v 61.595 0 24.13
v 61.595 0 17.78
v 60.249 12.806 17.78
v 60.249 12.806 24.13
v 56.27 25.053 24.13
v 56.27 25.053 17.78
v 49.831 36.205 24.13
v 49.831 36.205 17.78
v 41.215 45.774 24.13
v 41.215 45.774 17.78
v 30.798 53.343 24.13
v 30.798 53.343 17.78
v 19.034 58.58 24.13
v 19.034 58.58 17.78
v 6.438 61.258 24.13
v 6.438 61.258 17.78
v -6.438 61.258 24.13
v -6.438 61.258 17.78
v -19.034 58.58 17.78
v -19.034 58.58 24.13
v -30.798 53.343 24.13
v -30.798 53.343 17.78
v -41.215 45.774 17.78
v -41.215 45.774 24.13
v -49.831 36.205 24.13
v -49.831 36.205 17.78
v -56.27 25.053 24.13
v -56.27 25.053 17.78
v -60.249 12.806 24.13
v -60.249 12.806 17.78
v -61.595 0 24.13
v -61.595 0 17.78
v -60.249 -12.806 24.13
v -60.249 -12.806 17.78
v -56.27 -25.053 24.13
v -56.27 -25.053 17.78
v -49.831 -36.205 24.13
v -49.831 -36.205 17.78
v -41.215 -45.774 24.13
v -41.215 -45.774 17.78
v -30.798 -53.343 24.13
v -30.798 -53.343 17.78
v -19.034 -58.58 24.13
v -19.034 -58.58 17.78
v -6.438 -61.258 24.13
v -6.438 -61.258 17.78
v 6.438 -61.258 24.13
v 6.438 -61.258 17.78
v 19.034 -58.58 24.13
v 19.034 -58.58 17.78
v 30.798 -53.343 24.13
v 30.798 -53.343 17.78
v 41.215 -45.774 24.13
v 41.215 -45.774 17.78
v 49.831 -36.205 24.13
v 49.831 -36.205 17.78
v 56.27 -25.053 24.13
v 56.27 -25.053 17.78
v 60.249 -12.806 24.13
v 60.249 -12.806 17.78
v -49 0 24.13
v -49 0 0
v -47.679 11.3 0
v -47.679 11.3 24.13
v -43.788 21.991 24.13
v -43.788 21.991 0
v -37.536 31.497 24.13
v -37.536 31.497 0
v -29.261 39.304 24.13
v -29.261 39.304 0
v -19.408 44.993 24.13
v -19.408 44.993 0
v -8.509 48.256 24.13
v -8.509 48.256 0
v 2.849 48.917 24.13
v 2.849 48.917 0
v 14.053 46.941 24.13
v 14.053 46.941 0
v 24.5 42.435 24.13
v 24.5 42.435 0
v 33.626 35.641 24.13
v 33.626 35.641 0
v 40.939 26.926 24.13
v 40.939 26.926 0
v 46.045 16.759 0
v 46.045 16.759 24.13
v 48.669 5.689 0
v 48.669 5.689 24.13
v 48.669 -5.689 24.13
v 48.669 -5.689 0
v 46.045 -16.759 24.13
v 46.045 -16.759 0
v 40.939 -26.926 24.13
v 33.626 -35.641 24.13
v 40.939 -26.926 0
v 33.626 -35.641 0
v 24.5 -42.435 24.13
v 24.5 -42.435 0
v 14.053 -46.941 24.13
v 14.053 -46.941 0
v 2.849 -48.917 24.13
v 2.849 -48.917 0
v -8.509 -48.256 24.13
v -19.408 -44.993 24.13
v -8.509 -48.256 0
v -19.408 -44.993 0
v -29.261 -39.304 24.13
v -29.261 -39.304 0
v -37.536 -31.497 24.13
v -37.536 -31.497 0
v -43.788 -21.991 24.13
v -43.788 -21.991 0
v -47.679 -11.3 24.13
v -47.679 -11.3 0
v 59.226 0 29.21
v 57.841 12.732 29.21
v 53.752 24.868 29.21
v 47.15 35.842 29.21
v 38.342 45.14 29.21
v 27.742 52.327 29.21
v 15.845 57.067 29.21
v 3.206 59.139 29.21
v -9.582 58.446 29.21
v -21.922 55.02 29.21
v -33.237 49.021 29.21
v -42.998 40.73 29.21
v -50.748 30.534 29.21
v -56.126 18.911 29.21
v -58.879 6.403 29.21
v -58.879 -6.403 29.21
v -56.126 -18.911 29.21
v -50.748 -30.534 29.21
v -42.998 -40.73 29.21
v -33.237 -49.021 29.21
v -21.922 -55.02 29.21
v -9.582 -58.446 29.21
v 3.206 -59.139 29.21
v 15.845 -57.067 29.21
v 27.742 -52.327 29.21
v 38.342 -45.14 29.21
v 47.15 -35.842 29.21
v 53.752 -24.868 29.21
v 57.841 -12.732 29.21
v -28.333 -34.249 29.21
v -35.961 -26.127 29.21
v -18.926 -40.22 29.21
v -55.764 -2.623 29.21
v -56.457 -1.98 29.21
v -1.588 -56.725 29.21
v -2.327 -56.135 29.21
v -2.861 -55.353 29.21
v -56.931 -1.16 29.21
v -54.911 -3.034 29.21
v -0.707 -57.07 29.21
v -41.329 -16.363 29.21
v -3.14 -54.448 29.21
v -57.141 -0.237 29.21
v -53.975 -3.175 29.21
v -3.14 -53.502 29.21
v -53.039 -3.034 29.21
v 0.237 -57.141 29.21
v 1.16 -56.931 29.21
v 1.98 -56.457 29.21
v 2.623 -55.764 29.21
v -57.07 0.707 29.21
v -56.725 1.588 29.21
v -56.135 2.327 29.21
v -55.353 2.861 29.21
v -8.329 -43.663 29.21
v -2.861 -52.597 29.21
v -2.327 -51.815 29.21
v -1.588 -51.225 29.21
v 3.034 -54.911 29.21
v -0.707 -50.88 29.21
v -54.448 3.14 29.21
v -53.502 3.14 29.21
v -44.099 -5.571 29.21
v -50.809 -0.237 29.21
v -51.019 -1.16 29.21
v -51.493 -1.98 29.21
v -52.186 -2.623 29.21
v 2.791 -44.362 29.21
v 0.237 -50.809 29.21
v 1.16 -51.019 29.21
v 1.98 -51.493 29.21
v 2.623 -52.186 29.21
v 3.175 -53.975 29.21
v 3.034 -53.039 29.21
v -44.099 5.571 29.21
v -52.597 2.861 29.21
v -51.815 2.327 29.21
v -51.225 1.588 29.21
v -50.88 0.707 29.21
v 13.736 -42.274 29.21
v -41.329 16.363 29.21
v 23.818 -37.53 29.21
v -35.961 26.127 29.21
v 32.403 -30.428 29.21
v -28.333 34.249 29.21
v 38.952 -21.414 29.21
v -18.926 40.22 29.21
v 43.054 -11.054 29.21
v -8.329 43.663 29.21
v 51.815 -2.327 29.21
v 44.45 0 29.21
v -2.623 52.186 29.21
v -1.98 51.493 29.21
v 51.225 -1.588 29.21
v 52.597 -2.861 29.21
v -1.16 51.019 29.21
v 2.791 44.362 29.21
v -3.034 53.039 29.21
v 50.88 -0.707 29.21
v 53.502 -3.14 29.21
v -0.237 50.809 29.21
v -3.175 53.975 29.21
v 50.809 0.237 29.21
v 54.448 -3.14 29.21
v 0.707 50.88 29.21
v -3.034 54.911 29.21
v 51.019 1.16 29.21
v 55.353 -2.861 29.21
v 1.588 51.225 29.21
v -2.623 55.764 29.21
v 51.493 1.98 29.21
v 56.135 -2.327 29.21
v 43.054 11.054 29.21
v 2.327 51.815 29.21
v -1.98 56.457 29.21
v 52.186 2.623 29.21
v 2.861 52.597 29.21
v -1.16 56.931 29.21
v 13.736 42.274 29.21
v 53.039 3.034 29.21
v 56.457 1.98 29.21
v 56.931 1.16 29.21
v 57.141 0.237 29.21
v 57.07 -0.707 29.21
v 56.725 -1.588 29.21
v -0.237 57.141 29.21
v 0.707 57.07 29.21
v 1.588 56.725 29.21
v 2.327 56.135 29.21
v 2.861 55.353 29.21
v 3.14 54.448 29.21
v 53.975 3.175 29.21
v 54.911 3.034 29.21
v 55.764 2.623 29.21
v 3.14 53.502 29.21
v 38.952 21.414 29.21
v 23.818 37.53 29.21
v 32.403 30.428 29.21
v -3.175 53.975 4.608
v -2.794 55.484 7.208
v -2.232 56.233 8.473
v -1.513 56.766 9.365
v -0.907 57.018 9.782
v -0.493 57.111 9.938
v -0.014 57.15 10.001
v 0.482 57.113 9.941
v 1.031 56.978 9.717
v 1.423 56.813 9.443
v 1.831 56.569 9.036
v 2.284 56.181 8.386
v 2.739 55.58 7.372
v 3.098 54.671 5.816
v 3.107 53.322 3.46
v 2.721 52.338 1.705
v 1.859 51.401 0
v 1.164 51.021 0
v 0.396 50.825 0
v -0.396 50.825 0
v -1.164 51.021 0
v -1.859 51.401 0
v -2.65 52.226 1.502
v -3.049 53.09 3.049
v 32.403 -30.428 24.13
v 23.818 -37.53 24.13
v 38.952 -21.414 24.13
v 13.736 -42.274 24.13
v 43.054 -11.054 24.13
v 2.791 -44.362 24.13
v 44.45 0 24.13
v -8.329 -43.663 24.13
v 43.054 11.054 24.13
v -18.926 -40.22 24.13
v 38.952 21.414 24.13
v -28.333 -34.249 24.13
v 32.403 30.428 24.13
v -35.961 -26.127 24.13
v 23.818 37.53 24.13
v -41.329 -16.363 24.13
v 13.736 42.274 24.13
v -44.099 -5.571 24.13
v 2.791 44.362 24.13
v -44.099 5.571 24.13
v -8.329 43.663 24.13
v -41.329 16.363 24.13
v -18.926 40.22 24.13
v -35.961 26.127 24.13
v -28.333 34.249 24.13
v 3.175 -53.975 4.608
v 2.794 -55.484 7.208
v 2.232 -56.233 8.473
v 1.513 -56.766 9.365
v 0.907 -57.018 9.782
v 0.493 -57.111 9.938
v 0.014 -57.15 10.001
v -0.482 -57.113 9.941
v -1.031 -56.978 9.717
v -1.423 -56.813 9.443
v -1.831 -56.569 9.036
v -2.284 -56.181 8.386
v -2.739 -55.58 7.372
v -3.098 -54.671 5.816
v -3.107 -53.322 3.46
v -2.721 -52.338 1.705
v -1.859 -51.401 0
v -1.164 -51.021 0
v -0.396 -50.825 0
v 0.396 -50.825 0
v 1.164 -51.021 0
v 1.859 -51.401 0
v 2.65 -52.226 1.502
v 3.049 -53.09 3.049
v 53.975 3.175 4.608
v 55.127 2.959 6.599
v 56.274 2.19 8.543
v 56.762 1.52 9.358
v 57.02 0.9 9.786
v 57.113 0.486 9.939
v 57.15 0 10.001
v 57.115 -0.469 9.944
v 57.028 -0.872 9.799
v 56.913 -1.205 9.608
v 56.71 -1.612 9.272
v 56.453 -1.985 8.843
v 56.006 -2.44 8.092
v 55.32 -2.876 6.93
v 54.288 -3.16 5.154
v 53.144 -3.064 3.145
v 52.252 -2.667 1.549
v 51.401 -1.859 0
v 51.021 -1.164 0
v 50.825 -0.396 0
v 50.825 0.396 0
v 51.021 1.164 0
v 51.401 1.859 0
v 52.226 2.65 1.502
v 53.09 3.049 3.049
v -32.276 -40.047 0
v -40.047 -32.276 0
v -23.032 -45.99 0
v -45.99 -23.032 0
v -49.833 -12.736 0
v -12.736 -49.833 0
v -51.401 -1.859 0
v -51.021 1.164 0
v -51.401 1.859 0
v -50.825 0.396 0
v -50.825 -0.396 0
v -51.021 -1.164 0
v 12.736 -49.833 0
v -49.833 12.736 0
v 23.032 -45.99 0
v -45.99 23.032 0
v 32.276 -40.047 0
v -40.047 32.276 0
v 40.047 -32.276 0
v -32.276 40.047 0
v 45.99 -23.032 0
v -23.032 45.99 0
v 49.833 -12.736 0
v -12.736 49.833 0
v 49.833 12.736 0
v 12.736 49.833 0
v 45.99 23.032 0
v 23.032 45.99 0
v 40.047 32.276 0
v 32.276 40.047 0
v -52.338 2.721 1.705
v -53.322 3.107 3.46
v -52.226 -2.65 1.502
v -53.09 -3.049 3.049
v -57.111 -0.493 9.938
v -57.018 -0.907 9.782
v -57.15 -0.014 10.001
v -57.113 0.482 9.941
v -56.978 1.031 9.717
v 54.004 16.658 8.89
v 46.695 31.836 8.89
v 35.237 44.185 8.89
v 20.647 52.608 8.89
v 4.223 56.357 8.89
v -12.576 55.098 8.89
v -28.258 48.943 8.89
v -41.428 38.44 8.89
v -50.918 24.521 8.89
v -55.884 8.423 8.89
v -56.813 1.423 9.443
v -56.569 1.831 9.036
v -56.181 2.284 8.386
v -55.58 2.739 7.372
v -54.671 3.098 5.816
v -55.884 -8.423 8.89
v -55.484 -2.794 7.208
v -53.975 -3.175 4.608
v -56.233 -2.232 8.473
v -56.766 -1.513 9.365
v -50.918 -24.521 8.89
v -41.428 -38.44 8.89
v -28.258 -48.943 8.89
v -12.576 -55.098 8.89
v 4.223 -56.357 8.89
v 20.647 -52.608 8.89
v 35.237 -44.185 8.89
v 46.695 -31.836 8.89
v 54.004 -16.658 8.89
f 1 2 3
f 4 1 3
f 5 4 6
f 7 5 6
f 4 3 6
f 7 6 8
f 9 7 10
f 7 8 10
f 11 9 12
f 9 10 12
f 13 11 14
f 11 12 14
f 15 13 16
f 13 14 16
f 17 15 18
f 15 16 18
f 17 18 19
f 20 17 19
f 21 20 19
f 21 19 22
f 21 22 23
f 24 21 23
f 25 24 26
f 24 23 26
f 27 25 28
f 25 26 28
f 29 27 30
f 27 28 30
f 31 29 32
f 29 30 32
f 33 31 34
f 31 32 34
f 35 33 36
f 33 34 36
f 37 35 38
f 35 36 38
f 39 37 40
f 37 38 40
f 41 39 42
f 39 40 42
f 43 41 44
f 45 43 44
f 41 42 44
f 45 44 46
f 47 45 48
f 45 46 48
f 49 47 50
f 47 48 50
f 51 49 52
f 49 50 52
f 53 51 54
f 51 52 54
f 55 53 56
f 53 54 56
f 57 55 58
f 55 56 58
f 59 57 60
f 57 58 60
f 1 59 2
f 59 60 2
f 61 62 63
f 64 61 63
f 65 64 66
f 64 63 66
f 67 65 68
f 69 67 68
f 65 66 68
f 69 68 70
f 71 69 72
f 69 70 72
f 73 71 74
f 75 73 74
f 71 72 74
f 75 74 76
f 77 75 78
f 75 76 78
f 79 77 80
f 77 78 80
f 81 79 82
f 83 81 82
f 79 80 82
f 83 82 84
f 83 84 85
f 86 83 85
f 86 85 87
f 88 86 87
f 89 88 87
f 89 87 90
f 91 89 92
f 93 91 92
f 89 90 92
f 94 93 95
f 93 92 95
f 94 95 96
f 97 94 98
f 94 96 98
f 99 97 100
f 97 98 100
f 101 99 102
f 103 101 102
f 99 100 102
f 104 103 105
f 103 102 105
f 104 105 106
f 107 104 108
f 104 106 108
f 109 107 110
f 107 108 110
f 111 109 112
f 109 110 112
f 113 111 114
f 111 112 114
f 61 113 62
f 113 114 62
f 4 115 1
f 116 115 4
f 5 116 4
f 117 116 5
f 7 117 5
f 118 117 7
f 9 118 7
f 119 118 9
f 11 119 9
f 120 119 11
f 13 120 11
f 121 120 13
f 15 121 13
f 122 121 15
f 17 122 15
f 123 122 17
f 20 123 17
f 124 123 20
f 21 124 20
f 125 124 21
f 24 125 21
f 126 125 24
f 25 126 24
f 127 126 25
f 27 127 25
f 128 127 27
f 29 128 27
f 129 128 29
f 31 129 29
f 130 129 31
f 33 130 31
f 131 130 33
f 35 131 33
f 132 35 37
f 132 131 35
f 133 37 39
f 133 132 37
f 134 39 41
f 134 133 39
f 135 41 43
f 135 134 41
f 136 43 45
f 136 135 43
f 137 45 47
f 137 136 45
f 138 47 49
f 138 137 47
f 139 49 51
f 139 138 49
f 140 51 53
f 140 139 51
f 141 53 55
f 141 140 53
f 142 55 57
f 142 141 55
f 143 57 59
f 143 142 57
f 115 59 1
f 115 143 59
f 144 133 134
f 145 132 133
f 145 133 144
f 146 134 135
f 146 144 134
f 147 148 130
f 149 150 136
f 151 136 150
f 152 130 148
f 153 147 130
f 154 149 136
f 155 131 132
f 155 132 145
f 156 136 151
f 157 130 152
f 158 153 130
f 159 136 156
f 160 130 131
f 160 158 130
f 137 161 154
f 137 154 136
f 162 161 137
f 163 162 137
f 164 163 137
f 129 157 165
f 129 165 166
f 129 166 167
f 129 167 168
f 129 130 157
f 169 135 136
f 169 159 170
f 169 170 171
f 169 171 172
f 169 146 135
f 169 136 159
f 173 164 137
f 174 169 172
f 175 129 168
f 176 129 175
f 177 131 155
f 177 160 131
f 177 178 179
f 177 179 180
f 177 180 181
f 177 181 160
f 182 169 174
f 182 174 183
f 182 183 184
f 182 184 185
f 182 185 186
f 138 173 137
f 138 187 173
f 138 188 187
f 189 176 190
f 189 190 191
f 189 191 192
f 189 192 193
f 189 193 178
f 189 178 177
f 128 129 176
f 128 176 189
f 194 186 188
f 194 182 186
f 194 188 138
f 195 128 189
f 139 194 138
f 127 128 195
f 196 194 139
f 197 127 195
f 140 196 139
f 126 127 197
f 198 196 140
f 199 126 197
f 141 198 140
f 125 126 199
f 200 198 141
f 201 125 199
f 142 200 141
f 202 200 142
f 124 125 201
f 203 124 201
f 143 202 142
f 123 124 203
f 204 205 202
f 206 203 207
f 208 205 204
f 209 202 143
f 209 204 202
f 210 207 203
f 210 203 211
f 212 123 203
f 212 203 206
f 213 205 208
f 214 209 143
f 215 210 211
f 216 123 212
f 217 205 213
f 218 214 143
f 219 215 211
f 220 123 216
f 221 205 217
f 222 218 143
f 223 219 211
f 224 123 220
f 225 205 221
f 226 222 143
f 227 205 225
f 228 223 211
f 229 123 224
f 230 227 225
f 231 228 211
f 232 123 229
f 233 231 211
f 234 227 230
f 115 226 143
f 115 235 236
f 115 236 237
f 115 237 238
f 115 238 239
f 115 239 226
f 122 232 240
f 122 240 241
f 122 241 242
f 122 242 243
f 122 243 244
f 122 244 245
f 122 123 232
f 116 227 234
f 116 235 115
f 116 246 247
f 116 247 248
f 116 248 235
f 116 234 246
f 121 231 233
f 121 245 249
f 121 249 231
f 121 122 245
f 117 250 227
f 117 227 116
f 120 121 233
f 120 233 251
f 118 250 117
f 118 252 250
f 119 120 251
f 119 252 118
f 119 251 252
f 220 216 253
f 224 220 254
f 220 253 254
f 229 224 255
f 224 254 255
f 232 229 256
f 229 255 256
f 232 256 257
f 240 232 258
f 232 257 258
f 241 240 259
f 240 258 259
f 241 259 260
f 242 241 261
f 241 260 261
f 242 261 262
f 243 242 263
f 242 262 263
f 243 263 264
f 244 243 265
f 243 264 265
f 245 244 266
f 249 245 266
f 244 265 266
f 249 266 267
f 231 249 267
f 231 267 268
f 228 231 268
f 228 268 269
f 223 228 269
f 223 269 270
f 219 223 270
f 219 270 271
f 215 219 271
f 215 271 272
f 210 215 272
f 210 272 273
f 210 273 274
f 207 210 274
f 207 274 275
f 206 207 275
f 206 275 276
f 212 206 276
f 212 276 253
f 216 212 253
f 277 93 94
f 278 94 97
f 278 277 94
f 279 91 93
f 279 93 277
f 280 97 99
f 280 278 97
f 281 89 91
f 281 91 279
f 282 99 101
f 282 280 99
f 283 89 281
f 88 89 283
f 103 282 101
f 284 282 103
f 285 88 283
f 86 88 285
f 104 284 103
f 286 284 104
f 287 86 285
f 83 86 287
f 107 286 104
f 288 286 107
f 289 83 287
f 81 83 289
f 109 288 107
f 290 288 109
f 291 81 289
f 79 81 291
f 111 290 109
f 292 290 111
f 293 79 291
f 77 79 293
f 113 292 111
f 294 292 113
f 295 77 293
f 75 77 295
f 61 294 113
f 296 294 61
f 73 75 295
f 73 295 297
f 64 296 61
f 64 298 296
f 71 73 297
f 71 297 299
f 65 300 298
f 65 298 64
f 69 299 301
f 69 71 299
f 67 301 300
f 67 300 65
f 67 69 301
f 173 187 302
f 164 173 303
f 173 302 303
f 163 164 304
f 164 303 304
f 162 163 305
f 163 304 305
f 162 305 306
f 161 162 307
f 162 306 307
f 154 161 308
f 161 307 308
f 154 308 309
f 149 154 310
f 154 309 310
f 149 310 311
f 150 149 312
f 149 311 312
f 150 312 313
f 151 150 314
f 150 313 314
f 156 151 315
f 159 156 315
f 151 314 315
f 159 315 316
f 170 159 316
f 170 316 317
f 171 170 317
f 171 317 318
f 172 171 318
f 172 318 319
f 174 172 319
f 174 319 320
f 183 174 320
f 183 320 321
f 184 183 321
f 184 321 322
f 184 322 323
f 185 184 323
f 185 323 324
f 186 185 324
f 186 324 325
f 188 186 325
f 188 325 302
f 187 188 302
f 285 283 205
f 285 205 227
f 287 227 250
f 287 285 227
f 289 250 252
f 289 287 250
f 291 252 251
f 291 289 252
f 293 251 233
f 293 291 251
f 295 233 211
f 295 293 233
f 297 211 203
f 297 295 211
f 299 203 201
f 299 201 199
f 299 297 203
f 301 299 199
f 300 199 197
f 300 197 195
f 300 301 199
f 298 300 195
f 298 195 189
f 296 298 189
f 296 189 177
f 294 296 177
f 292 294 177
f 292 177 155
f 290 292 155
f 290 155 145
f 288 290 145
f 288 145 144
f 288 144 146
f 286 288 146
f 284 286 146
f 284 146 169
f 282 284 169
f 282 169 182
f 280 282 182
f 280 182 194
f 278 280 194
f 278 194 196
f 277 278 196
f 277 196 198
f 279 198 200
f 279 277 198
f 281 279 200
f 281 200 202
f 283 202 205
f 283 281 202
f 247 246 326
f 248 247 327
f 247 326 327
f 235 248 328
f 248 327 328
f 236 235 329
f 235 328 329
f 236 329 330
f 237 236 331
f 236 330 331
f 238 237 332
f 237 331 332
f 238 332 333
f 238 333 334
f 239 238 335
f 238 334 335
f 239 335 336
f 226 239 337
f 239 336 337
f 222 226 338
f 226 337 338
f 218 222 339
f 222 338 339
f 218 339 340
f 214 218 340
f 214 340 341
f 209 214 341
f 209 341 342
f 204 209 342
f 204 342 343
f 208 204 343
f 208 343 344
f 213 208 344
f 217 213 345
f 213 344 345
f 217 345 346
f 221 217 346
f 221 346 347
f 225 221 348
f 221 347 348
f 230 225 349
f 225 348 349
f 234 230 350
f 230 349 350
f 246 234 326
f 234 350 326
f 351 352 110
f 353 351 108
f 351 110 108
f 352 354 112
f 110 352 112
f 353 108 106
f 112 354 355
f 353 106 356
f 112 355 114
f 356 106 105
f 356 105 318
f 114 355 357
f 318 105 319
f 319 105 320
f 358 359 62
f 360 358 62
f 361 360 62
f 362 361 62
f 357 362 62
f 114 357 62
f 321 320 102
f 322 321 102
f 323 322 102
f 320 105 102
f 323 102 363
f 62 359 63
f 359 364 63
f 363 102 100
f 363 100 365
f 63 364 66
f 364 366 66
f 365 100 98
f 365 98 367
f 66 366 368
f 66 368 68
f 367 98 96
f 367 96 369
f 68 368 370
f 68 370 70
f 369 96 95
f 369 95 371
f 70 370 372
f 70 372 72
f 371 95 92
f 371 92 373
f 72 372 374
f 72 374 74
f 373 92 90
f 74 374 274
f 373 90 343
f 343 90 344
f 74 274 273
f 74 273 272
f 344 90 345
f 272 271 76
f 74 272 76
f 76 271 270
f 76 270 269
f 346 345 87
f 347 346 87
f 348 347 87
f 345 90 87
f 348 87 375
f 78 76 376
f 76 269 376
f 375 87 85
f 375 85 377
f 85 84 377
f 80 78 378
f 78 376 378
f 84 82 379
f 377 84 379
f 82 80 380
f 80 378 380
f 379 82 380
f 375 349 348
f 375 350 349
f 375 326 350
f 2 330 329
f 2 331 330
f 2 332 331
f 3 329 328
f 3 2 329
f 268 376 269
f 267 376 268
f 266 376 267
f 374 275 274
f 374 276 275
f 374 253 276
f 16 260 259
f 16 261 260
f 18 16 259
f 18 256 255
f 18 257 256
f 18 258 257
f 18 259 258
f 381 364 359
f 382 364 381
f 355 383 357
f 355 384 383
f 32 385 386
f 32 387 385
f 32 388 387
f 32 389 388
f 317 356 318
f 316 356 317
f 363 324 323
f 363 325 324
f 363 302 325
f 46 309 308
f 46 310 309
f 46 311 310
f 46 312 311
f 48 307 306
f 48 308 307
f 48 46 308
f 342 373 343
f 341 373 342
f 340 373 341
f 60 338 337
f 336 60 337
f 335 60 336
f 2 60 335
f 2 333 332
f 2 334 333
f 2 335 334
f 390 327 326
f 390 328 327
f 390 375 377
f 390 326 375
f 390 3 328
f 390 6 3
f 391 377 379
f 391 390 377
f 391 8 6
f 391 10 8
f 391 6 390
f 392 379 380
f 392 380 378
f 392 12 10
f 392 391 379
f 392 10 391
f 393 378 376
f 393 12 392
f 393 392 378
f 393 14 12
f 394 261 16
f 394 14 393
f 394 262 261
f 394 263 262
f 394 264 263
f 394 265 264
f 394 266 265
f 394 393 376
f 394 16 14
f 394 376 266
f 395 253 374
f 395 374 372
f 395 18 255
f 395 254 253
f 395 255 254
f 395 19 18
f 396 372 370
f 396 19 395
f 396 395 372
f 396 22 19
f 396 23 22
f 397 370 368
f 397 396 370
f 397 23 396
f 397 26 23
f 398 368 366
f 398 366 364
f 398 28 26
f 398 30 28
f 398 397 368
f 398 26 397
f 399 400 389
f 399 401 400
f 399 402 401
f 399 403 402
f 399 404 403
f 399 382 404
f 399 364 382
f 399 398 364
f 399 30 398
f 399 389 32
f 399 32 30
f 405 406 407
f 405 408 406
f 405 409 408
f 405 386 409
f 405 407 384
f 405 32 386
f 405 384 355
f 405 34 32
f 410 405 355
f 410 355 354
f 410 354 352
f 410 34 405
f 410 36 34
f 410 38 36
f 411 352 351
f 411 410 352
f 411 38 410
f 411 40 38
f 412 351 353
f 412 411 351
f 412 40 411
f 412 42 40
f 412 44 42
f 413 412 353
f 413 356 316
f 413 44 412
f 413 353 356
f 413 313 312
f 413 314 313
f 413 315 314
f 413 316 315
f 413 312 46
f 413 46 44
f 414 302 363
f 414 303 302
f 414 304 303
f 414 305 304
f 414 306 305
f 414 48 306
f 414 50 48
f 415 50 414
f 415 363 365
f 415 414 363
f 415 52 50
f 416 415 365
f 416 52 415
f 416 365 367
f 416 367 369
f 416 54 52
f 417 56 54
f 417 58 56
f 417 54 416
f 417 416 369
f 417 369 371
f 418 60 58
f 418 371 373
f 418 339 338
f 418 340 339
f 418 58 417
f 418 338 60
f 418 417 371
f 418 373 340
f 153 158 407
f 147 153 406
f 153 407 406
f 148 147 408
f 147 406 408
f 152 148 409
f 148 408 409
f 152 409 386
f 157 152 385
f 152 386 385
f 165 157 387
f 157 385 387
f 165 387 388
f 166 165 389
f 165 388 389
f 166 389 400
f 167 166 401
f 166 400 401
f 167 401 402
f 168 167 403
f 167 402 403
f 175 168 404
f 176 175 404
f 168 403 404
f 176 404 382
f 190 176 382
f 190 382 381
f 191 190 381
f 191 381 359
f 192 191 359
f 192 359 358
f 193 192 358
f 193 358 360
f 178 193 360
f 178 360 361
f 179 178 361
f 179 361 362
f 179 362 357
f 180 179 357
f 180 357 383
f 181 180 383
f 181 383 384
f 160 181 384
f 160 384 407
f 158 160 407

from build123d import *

# Parameters (mm, degrees)
SKETCH1_R                   = 61.595
SKETCH1_R_2                 = 44.45
EXTRUDE1_DEPTH              = 29.21
SKETCH2_R                   = 49
EXTRUDE2_DEPTH              = 24.13
CHAMFER2_SIZE               = 10.16
CHAMFER2_SIZE2              = 17.78
F_1_4_0_25_DIAMETER_HOLE1_D = 6.35
CIRPATTERN1_COUNT           = 4
CHAMFER1_SIZE               = 5.08
CHAMFER1_SIZE2              = 2.368842903


with BuildPart() as part:
    # Sketch1 → Extrude1 (new body)
    with BuildSketch(Plane.XY):
        Circle(SKETCH1_R)
        Circle(SKETCH1_R_2, mode=Mode.SUBTRACT)
    extrude(amount=EXTRUDE1_DEPTH)

    # Sketch2 → Extrude2 (cut)
    with BuildSketch(Plane(origin=(0, 0, 0), x_dir=(-1, 0, 0), z_dir=(0, 0, -1))):
        Circle(SKETCH2_R)
    extrude(amount=-EXTRUDE2_DEPTH, mode=Mode.SUBTRACT)

    # Chamfer2
    chamfer2_edges = [part.edges().sort_by_distance(p)[0] for p in [
        (-61.595, 0, 0),
    ]]
    chamfer2_side = [part.faces().sort_by_distance(p)[0] for p in [
        (-59.852830313, 0, 0),
    ]]
    chamfer(chamfer2_edges, length=CHAMFER2_SIZE, length2=CHAMFER2_SIZE2, reference=chamfer2_side[0])

    # 1/4 (0.25) Diameter Hole1 (through all)
    with Locations(Plane.XY.offset(29.21)):
        with Locations((0, 53.975)):
            f_1_4_0_25_diameter_hole1 = Hole(F_1_4_0_25_DIAMETER_HOLE1_D / 2)

    # CirPattern1: 1/4 (0.25) Diameter Hole1 ×4 about axis
    cirpattern1_axis = Axis((0, 0, 0), (0, 0, 1))
    for i in range(1, CIRPATTERN1_COUNT):
        add(f_1_4_0_25_diameter_hole1.rotate(cirpattern1_axis, i * 360 / CIRPATTERN1_COUNT), mode=Mode.SUBTRACT)

    # Chamfer1
    chamfer1_edges = [part.edges().sort_by_distance(p)[0] for p in [
        (-61.595, 0, 29.21),
    ]]
    chamfer1_side = [part.faces().sort_by_distance(p)[0] for p in [
        (-61.595, 0, 23.495),
    ]]
    chamfer(chamfer1_edges, length=CHAMFER1_SIZE, length2=CHAMFER1_SIZE2, reference=chamfer1_side[0])


solid = part.part
